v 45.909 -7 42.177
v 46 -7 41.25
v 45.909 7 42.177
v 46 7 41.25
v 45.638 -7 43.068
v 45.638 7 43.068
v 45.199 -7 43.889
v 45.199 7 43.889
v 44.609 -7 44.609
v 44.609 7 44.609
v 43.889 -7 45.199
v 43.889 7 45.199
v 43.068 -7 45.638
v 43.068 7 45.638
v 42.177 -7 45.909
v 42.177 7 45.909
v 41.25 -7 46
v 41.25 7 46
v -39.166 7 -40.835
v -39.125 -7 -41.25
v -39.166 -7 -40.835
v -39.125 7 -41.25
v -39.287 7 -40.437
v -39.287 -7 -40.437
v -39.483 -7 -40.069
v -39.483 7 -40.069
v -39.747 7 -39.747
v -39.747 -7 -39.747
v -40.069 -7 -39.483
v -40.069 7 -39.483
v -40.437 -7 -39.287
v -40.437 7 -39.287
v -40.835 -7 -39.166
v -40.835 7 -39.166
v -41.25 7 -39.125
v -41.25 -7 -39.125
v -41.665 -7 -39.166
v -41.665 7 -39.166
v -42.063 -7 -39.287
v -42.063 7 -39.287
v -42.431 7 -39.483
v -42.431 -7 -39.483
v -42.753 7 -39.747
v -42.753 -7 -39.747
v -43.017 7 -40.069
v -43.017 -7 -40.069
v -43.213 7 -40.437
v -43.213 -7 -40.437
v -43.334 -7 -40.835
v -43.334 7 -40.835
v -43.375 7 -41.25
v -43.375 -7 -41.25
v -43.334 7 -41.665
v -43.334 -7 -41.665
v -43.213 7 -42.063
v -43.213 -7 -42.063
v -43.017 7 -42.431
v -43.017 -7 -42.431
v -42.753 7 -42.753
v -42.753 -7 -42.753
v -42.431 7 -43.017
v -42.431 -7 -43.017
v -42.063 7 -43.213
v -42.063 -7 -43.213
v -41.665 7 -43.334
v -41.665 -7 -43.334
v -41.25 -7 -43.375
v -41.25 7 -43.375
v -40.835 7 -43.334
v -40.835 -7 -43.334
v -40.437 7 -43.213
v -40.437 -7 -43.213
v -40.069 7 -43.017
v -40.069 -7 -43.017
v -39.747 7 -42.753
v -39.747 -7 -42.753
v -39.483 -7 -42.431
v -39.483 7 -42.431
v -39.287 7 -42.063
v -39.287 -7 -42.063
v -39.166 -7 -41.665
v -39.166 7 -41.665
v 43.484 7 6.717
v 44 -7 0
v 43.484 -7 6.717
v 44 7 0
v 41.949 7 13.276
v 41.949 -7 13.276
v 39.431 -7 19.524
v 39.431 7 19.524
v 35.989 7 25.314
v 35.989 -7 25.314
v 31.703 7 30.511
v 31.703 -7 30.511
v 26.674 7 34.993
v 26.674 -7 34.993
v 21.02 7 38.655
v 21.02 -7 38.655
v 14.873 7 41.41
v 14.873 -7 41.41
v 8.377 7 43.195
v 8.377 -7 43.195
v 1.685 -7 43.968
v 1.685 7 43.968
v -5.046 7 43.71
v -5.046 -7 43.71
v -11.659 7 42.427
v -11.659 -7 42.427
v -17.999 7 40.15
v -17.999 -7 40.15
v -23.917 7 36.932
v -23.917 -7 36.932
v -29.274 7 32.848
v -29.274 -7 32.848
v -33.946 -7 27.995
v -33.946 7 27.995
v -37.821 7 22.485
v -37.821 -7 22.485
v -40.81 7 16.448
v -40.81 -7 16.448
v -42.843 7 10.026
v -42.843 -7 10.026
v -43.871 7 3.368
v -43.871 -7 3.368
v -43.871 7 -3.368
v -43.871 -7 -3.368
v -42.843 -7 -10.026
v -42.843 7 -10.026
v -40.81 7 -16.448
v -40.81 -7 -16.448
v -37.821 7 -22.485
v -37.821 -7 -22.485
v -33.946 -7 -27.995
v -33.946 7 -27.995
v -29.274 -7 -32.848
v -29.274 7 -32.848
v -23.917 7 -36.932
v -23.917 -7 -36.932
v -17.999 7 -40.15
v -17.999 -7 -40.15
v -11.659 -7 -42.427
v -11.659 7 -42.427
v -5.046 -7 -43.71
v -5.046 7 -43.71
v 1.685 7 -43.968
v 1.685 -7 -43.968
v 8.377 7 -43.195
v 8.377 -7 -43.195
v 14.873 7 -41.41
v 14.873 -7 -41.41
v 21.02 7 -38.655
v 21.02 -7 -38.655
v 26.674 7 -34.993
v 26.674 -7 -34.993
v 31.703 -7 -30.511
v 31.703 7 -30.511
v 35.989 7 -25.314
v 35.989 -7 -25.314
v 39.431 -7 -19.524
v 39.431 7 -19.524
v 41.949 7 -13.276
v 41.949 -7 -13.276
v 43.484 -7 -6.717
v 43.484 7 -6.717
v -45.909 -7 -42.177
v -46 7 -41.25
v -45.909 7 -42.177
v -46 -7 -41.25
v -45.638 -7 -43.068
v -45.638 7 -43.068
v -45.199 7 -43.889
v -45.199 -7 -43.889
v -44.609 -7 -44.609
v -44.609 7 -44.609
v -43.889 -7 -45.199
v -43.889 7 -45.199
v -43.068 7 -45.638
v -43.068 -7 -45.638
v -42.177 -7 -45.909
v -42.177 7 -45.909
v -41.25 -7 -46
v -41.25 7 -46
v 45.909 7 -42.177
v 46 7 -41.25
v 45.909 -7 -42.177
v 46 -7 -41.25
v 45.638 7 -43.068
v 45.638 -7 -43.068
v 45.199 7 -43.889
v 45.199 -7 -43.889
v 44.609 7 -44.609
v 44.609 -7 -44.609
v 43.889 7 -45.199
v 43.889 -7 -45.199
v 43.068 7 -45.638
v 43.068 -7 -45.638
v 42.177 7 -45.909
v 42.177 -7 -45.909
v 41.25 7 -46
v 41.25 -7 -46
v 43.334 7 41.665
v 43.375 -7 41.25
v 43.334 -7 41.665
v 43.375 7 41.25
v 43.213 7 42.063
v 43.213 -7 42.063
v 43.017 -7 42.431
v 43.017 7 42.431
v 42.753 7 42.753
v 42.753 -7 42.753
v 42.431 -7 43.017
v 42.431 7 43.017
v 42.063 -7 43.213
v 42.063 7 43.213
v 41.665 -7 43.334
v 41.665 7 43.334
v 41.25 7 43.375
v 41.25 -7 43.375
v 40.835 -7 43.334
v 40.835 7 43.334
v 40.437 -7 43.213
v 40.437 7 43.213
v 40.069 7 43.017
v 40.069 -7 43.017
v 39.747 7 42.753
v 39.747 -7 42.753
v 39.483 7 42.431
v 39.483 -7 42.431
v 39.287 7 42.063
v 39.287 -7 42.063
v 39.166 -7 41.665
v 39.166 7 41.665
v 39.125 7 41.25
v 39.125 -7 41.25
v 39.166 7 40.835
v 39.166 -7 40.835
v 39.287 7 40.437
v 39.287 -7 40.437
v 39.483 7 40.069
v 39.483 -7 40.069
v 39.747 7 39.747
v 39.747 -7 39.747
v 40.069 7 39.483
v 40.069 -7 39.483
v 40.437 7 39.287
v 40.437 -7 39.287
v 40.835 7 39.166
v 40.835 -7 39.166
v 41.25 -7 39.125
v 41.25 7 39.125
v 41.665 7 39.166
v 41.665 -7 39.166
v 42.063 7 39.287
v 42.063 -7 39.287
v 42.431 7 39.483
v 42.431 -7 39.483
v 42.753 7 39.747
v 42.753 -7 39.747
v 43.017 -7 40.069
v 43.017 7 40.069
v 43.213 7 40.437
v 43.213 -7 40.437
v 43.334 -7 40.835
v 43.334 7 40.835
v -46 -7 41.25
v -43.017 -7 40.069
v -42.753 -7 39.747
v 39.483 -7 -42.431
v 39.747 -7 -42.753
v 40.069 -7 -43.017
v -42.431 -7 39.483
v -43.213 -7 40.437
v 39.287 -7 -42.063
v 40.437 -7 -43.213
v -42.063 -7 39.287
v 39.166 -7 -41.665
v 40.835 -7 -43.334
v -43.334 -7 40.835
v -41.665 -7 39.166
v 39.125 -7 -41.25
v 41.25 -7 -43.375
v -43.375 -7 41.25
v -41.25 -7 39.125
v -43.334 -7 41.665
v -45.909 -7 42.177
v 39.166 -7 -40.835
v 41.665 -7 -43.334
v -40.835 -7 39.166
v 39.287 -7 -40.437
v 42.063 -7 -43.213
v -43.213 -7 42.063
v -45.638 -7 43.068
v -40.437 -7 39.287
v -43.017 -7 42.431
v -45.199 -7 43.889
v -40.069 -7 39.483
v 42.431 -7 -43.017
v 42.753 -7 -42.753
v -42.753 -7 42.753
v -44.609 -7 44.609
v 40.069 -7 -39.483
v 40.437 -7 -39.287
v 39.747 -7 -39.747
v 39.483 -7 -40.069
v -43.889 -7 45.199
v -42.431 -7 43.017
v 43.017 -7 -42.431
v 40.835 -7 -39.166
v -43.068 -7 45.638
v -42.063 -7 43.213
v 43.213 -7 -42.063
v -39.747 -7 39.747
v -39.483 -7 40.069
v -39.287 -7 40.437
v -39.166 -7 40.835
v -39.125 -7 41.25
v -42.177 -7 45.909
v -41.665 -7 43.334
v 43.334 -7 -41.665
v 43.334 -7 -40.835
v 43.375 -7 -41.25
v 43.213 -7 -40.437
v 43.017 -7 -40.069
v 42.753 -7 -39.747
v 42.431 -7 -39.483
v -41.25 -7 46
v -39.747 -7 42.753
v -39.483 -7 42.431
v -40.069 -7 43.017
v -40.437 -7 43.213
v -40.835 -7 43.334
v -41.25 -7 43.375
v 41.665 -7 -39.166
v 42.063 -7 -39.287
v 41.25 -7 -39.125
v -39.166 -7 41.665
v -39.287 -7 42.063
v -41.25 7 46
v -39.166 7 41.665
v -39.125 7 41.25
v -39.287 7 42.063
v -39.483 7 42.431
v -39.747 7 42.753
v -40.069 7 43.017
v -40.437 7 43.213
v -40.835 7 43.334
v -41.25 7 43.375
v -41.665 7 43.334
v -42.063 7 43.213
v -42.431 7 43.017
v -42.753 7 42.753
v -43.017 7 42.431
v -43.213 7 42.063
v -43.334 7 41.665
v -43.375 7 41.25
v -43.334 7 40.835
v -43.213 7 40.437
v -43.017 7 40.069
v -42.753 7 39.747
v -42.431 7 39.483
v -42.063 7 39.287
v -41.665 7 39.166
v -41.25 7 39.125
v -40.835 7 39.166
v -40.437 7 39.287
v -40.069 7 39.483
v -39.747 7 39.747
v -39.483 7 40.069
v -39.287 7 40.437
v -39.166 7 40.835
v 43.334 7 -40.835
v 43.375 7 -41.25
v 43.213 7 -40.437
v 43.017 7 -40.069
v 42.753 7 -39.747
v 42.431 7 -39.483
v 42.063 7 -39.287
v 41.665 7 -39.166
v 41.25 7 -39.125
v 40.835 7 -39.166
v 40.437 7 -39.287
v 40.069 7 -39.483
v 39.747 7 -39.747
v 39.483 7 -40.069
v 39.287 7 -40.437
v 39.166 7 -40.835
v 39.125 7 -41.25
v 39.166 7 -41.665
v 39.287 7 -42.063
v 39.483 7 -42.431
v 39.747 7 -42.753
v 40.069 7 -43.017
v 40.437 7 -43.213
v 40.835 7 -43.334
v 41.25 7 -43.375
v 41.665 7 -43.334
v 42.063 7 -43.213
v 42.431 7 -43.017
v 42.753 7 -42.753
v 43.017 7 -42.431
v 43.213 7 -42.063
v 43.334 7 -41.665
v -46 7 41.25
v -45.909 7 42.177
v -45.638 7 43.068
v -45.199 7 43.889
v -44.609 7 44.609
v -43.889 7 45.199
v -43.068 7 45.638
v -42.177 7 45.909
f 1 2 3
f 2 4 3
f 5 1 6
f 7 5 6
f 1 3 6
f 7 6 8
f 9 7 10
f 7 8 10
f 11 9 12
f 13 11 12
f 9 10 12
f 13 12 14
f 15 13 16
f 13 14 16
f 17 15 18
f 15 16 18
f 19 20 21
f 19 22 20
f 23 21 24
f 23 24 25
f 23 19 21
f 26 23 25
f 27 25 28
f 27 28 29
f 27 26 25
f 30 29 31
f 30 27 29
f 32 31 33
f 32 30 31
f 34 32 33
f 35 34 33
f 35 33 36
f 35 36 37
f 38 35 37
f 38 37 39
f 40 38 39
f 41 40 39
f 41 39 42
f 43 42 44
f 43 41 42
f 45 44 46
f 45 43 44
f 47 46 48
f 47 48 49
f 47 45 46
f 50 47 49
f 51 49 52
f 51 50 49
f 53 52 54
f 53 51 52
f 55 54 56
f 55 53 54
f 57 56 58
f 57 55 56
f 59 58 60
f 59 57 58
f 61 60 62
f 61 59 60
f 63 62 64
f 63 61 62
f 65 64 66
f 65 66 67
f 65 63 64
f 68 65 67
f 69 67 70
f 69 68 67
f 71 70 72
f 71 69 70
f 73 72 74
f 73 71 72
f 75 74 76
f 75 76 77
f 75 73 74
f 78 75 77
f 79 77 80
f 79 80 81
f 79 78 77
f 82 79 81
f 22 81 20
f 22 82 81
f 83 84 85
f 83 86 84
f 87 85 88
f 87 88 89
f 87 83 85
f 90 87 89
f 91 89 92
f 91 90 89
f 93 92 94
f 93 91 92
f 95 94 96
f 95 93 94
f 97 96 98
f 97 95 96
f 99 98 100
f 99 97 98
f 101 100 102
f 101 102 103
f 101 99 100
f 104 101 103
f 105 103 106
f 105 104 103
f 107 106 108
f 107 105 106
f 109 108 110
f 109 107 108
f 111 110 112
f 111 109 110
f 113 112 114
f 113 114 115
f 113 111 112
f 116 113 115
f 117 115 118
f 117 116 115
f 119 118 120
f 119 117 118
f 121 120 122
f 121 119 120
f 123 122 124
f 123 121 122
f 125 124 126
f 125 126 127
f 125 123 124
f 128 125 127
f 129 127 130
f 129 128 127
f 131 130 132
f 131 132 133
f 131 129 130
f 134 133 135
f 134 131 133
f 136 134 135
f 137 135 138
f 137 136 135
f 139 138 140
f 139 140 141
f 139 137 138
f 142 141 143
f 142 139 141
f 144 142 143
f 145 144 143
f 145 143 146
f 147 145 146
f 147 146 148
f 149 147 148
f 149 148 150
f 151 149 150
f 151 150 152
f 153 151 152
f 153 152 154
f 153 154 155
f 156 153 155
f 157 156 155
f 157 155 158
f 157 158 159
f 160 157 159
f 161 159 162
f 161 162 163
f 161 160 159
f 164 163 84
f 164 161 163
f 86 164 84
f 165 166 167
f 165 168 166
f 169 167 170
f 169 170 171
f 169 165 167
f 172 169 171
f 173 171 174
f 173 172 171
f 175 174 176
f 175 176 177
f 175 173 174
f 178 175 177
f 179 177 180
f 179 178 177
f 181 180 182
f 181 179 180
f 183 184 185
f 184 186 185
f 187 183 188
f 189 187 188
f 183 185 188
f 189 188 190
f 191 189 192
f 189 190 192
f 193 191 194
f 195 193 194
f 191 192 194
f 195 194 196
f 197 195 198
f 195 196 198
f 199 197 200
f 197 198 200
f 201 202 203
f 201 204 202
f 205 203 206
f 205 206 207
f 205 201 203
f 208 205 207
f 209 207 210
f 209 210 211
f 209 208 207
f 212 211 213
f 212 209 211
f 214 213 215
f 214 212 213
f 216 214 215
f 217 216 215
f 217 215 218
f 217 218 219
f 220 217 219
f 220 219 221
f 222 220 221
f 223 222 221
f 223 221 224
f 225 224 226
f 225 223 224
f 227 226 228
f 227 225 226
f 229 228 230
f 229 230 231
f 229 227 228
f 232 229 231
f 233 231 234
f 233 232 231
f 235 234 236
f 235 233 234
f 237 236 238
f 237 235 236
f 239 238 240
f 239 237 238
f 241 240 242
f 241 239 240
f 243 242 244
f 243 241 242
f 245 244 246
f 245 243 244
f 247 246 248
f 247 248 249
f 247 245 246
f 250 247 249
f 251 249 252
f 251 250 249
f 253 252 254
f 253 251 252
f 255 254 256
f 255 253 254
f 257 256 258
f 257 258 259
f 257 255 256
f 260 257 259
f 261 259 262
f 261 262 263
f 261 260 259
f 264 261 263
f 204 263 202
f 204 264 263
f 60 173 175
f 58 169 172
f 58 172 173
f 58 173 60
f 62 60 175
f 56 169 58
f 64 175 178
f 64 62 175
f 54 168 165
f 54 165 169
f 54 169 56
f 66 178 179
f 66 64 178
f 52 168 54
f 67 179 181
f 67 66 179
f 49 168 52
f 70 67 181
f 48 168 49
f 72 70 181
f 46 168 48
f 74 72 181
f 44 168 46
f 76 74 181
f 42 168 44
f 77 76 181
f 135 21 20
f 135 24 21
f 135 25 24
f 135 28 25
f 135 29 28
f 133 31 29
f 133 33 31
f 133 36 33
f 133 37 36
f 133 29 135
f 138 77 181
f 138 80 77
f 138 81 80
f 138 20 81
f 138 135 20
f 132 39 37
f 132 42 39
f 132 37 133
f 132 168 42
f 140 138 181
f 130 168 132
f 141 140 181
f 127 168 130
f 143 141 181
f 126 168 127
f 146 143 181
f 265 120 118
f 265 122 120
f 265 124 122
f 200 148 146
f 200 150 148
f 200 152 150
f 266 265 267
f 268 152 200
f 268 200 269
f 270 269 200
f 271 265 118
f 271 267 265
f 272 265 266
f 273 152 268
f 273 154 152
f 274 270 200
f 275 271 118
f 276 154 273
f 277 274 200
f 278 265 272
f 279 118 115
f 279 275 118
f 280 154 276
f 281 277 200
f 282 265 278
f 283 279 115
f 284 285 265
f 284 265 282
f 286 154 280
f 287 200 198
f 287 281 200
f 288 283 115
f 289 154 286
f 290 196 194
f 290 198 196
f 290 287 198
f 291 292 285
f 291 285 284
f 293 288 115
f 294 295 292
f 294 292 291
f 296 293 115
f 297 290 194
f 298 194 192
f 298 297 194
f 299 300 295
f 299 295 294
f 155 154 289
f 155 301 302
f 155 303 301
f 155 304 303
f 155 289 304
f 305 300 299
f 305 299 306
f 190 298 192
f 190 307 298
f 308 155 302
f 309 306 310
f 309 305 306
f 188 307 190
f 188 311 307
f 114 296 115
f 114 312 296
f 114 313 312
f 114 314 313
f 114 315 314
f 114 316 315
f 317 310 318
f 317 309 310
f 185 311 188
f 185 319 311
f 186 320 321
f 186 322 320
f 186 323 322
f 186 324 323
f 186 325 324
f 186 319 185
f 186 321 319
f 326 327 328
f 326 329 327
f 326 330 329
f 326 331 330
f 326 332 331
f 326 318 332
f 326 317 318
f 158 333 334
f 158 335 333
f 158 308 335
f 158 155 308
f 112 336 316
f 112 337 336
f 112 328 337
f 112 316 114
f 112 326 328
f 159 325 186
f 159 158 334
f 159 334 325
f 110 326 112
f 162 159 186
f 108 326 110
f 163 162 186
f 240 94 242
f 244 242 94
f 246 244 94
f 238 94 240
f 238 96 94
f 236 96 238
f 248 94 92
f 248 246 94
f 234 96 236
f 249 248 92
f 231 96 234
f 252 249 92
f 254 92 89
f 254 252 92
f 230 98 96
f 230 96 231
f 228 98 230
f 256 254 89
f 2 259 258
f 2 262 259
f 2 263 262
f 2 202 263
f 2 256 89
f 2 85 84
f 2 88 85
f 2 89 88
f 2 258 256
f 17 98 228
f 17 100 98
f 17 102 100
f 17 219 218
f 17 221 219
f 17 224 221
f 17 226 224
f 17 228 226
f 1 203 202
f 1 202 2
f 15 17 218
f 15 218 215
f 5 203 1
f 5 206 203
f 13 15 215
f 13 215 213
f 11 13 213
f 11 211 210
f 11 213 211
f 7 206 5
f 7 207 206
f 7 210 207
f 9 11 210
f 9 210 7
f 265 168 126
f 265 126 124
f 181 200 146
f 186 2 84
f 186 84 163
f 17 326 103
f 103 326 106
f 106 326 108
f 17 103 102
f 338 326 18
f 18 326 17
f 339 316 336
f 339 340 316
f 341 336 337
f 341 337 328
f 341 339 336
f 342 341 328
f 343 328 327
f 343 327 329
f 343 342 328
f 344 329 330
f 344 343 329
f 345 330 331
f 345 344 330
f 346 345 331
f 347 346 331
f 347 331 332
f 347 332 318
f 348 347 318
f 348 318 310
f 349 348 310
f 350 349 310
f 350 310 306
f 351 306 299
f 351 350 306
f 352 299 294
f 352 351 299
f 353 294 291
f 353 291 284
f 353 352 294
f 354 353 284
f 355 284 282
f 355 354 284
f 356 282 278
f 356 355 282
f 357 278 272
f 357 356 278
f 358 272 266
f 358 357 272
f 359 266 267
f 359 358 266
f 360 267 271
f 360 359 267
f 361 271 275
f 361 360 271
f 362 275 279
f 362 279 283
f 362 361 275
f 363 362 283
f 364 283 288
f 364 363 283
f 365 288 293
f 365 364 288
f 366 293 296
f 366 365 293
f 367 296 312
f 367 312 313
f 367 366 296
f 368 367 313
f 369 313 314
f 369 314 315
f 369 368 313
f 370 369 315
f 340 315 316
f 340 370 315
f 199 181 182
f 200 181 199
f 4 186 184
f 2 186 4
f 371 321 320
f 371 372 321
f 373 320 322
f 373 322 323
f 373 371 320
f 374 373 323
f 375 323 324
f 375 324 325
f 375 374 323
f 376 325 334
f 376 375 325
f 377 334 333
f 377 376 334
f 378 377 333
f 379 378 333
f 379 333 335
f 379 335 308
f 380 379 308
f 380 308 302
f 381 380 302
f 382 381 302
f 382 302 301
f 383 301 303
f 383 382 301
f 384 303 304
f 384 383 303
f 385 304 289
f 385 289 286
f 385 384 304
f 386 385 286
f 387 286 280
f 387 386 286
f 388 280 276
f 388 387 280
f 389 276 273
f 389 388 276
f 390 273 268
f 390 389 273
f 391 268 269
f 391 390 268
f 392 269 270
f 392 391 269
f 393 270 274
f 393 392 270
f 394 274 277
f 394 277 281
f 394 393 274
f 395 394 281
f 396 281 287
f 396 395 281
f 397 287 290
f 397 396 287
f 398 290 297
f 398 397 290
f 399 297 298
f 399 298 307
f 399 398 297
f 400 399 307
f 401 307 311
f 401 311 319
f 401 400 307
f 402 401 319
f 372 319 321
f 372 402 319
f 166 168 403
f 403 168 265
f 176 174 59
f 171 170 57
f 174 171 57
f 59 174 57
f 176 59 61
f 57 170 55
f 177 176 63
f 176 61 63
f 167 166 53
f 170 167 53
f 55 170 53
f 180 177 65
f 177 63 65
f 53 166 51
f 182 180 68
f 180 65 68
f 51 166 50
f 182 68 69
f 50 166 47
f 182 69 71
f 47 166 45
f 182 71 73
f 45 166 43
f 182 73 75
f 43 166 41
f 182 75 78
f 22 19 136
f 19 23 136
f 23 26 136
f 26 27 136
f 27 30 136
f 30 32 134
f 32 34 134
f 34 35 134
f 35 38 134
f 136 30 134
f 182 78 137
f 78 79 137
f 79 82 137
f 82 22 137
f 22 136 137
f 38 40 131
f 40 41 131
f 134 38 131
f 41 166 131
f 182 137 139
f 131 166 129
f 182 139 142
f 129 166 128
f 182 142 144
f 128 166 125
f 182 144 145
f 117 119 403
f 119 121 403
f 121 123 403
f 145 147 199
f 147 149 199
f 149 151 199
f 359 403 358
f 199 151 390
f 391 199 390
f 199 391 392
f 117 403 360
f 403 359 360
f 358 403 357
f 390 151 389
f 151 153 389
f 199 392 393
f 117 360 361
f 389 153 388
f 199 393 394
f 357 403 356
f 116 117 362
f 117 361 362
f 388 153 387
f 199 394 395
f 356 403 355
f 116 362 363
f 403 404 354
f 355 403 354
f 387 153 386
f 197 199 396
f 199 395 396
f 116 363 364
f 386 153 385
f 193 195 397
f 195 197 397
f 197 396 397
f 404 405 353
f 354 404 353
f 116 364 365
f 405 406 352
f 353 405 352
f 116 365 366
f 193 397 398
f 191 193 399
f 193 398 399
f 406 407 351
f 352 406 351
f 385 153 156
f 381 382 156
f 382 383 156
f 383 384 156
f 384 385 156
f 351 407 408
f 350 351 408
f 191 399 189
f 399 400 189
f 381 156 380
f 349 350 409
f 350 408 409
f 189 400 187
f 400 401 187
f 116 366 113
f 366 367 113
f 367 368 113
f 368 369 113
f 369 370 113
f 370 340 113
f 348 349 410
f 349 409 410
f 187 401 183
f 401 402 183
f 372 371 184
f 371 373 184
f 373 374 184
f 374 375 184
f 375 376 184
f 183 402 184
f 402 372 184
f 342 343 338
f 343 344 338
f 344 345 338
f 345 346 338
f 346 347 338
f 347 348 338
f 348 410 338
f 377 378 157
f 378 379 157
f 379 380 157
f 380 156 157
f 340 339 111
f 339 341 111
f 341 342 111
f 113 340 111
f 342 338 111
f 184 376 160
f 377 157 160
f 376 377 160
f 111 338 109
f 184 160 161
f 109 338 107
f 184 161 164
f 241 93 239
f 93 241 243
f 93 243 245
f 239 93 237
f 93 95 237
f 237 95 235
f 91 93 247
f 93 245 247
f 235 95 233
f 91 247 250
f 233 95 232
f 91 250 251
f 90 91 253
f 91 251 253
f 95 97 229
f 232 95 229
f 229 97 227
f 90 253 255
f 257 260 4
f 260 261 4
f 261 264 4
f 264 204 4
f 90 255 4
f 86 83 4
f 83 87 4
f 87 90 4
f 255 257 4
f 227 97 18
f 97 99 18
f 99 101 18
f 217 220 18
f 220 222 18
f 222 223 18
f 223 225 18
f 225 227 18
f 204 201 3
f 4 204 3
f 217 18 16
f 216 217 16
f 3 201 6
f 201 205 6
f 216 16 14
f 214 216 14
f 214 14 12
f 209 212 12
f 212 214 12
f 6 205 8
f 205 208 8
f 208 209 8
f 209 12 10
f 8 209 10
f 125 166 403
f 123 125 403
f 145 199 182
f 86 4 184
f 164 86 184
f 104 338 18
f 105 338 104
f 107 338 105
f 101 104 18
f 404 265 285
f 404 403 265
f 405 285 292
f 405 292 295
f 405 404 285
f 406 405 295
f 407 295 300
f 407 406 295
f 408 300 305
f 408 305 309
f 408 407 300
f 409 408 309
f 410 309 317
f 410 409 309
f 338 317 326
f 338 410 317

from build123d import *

# Parameters (mm, degrees)
F0_W     = 92
F0_H     = 92
F0_R     = 2.125
F0_R_2   = 44
F1_DEPTH = 7
F2_R     = 4.75


with BuildPart() as f1:
    # F0 (on Front) → F1 (new body, symmetric)
    with BuildSketch(Plane.XZ):
        Rectangle(F0_W, F0_H)
        with Locations((-41.25, -41.25)):
            Circle(F0_R, mode=Mode.SUBTRACT)
        with Locations((41.25, -41.25)):
            Circle(F0_R, mode=Mode.SUBTRACT)
        with Locations((-41.25, 41.25)):
            Circle(F0_R, mode=Mode.SUBTRACT)
        Circle(F0_R_2, mode=Mode.SUBTRACT)
        with Locations((41.25, 41.25)):
            Circle(F0_R, mode=Mode.SUBTRACT)
    extrude(amount=F1_DEPTH, both=True)

    # F2
    f2_edges = [f1.edges().sort_by_distance(p)[0] for p in [
        (-46, 0, 46),
        (46, 0, 46),
        (46, 0, -46),
        (-46, 0, -46),
    ]]
    fillet(f2_edges, radius=F2_R)


solid = f1.part
